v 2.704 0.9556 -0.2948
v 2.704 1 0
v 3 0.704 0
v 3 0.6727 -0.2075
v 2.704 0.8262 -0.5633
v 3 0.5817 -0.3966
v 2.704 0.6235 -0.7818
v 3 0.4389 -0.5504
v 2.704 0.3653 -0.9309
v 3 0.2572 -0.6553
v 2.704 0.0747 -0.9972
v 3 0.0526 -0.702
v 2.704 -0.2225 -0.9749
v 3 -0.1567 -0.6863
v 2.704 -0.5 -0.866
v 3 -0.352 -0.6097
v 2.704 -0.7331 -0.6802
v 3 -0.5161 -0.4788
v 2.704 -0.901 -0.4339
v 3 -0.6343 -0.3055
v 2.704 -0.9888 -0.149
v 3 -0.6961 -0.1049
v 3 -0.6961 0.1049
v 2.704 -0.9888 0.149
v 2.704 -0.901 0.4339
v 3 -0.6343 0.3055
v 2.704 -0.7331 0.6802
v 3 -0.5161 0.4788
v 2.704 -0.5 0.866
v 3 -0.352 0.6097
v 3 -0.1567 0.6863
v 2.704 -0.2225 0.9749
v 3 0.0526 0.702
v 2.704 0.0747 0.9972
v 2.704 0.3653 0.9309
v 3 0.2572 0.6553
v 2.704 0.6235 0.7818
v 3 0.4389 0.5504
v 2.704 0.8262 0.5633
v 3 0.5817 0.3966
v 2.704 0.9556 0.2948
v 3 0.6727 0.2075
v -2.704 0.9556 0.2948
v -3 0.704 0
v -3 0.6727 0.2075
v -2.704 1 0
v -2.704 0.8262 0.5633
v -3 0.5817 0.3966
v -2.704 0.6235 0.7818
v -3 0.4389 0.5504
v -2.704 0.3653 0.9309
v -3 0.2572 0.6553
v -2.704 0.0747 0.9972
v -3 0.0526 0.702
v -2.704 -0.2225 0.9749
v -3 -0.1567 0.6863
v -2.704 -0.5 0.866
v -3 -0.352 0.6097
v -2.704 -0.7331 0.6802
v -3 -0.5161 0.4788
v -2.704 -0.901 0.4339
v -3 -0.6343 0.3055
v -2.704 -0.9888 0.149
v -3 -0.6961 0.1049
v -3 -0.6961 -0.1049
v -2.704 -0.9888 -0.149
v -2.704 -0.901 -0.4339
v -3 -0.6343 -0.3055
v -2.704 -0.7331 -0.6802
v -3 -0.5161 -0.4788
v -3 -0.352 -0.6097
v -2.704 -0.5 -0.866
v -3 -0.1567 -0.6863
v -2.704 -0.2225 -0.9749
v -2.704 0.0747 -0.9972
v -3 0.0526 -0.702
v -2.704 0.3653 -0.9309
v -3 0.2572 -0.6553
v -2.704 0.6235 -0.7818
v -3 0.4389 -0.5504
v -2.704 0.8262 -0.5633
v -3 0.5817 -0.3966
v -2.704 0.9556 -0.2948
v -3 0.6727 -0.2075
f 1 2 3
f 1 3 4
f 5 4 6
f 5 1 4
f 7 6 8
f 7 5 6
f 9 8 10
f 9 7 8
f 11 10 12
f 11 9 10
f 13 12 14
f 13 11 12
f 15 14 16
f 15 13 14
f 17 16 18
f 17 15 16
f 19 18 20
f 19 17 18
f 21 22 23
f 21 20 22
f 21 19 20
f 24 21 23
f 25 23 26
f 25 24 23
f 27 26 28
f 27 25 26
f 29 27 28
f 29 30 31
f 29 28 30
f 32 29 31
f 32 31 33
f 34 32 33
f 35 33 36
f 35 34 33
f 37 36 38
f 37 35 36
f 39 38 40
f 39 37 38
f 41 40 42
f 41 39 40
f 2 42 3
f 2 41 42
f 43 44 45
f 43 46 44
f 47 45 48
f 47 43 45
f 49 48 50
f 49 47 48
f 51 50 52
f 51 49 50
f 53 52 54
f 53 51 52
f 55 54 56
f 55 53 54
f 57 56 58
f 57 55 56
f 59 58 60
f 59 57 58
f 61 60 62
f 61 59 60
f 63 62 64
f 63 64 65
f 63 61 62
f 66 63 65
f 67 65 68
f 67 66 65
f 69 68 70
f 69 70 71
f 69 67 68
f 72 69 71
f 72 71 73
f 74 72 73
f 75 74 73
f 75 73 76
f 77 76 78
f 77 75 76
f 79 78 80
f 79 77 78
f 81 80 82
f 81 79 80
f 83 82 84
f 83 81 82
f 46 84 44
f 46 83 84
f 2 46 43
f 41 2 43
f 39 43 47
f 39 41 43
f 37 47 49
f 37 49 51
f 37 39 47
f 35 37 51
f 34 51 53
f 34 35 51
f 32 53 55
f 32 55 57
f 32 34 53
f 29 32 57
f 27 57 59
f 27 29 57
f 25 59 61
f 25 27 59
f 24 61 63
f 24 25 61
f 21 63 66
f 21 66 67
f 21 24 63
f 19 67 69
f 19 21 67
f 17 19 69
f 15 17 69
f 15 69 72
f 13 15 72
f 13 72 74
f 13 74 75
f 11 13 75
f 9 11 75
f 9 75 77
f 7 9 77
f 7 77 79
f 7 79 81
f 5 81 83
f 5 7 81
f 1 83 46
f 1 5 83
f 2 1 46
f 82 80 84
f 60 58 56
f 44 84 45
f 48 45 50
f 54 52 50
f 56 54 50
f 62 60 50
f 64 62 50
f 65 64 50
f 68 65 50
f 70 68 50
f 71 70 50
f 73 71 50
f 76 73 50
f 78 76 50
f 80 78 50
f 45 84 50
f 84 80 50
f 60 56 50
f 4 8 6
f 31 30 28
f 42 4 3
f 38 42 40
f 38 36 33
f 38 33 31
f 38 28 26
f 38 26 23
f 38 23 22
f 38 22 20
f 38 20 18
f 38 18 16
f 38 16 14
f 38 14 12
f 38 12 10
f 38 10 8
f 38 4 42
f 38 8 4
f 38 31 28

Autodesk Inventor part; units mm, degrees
ref_plane "YZ Plane" through (0, 0, 0) normal (1, 0, 0) x (0, 1, 0)
ref_plane "XZ Plane" through (0, 0, 0) normal (0, 1, 0) x (-1, 0, 0)
sketch "Sketch1" plane through (0, 0, 0) normal (0, 0, 1) x (1, 0, 0)
  line L0 (3, 1) -> (3, 0)
  line L1 (-3, 0) -> (3, 0)
  line L2 (-4.2, 0) -> (4.2, 0) projected
  line L3 (0, 1.2) -> (0, -0.2) projected
  line L4 (-3, 1) -> (-3, 0)
  line L5 (0, 1) -> (0, 0) construction
  line L6 (-4.2, 0) -> (4.2, 0) projected
  line L7 (-3, 1) -> (3, 1)
  dimension "d13" = 2
  dimension "d87" = 6
  dimension "d88" = 3
revolve "Body" add sketch "Sketch1" angle 360 about axis through (-3, 0, 0) along (1, 0, 0)
thread "Thread1" size "M2x0.4" class "6g" standard "ISO Metric profile" length 6
chamfer "Chamfer1" distance 0.296 angle 45 1 edges at (3, -1, 0) measured on face at (-1, 0.9871, -0.1604)
chamfer "Chamfer2" distance 0.296 angle 45 1 edges at (-3, -1, 0) measured on face at (-1.0987, 0.9968, -0.0805)
ref_plane "Work Plane1" through (2.75, 0, 0) normal (0, -1, 0) x (1, 0, 0)
equation "\"d13\" = NND"
equation "\"d87\" = NLG"
equation "\"d88\" = 0.5 * NLG"
equation "\"d1\" = GEL"
equation "\"d9\" = -0.5 * SPD + 0.5 * NND"
equation "\"d10\" = -0.5 * SPD + 0.5 * NND"
equation "\"d11\" = -0.5 * SPD + 0.5 * NND"
equation "\"d12\" = -0.5 * SPD + 0.5 * NND"
equation "\"NLG\" = 6"
equation "\"GEL\" = NLG"
equation "\"GAL\" = 0.61345 * PTC"
equation "\"SPD\" = 1.408"
equation "\"d0\" = NND"
equation "\"GUL\" = 0.61345 * PTC"
equation "\"NND\" = 2"
equation "\"GUL1\" = GUL"
equation "\"GAL1\" = GAL"
equation "\"d80\" = -GUL - GEL"
equation "\"d86\" = -GEL + GUL1"
equation "\"PTC\" = 0.4"
equation "\"THREADDIA\" = 2"
equation "\"TOA\" = 30deg"
equation "\"GD1\" = THREADDIA - 1.2269 * PTC"
properties part number "DIN 976-1 - M2 x 6 - B" material "Steel, Mild"
